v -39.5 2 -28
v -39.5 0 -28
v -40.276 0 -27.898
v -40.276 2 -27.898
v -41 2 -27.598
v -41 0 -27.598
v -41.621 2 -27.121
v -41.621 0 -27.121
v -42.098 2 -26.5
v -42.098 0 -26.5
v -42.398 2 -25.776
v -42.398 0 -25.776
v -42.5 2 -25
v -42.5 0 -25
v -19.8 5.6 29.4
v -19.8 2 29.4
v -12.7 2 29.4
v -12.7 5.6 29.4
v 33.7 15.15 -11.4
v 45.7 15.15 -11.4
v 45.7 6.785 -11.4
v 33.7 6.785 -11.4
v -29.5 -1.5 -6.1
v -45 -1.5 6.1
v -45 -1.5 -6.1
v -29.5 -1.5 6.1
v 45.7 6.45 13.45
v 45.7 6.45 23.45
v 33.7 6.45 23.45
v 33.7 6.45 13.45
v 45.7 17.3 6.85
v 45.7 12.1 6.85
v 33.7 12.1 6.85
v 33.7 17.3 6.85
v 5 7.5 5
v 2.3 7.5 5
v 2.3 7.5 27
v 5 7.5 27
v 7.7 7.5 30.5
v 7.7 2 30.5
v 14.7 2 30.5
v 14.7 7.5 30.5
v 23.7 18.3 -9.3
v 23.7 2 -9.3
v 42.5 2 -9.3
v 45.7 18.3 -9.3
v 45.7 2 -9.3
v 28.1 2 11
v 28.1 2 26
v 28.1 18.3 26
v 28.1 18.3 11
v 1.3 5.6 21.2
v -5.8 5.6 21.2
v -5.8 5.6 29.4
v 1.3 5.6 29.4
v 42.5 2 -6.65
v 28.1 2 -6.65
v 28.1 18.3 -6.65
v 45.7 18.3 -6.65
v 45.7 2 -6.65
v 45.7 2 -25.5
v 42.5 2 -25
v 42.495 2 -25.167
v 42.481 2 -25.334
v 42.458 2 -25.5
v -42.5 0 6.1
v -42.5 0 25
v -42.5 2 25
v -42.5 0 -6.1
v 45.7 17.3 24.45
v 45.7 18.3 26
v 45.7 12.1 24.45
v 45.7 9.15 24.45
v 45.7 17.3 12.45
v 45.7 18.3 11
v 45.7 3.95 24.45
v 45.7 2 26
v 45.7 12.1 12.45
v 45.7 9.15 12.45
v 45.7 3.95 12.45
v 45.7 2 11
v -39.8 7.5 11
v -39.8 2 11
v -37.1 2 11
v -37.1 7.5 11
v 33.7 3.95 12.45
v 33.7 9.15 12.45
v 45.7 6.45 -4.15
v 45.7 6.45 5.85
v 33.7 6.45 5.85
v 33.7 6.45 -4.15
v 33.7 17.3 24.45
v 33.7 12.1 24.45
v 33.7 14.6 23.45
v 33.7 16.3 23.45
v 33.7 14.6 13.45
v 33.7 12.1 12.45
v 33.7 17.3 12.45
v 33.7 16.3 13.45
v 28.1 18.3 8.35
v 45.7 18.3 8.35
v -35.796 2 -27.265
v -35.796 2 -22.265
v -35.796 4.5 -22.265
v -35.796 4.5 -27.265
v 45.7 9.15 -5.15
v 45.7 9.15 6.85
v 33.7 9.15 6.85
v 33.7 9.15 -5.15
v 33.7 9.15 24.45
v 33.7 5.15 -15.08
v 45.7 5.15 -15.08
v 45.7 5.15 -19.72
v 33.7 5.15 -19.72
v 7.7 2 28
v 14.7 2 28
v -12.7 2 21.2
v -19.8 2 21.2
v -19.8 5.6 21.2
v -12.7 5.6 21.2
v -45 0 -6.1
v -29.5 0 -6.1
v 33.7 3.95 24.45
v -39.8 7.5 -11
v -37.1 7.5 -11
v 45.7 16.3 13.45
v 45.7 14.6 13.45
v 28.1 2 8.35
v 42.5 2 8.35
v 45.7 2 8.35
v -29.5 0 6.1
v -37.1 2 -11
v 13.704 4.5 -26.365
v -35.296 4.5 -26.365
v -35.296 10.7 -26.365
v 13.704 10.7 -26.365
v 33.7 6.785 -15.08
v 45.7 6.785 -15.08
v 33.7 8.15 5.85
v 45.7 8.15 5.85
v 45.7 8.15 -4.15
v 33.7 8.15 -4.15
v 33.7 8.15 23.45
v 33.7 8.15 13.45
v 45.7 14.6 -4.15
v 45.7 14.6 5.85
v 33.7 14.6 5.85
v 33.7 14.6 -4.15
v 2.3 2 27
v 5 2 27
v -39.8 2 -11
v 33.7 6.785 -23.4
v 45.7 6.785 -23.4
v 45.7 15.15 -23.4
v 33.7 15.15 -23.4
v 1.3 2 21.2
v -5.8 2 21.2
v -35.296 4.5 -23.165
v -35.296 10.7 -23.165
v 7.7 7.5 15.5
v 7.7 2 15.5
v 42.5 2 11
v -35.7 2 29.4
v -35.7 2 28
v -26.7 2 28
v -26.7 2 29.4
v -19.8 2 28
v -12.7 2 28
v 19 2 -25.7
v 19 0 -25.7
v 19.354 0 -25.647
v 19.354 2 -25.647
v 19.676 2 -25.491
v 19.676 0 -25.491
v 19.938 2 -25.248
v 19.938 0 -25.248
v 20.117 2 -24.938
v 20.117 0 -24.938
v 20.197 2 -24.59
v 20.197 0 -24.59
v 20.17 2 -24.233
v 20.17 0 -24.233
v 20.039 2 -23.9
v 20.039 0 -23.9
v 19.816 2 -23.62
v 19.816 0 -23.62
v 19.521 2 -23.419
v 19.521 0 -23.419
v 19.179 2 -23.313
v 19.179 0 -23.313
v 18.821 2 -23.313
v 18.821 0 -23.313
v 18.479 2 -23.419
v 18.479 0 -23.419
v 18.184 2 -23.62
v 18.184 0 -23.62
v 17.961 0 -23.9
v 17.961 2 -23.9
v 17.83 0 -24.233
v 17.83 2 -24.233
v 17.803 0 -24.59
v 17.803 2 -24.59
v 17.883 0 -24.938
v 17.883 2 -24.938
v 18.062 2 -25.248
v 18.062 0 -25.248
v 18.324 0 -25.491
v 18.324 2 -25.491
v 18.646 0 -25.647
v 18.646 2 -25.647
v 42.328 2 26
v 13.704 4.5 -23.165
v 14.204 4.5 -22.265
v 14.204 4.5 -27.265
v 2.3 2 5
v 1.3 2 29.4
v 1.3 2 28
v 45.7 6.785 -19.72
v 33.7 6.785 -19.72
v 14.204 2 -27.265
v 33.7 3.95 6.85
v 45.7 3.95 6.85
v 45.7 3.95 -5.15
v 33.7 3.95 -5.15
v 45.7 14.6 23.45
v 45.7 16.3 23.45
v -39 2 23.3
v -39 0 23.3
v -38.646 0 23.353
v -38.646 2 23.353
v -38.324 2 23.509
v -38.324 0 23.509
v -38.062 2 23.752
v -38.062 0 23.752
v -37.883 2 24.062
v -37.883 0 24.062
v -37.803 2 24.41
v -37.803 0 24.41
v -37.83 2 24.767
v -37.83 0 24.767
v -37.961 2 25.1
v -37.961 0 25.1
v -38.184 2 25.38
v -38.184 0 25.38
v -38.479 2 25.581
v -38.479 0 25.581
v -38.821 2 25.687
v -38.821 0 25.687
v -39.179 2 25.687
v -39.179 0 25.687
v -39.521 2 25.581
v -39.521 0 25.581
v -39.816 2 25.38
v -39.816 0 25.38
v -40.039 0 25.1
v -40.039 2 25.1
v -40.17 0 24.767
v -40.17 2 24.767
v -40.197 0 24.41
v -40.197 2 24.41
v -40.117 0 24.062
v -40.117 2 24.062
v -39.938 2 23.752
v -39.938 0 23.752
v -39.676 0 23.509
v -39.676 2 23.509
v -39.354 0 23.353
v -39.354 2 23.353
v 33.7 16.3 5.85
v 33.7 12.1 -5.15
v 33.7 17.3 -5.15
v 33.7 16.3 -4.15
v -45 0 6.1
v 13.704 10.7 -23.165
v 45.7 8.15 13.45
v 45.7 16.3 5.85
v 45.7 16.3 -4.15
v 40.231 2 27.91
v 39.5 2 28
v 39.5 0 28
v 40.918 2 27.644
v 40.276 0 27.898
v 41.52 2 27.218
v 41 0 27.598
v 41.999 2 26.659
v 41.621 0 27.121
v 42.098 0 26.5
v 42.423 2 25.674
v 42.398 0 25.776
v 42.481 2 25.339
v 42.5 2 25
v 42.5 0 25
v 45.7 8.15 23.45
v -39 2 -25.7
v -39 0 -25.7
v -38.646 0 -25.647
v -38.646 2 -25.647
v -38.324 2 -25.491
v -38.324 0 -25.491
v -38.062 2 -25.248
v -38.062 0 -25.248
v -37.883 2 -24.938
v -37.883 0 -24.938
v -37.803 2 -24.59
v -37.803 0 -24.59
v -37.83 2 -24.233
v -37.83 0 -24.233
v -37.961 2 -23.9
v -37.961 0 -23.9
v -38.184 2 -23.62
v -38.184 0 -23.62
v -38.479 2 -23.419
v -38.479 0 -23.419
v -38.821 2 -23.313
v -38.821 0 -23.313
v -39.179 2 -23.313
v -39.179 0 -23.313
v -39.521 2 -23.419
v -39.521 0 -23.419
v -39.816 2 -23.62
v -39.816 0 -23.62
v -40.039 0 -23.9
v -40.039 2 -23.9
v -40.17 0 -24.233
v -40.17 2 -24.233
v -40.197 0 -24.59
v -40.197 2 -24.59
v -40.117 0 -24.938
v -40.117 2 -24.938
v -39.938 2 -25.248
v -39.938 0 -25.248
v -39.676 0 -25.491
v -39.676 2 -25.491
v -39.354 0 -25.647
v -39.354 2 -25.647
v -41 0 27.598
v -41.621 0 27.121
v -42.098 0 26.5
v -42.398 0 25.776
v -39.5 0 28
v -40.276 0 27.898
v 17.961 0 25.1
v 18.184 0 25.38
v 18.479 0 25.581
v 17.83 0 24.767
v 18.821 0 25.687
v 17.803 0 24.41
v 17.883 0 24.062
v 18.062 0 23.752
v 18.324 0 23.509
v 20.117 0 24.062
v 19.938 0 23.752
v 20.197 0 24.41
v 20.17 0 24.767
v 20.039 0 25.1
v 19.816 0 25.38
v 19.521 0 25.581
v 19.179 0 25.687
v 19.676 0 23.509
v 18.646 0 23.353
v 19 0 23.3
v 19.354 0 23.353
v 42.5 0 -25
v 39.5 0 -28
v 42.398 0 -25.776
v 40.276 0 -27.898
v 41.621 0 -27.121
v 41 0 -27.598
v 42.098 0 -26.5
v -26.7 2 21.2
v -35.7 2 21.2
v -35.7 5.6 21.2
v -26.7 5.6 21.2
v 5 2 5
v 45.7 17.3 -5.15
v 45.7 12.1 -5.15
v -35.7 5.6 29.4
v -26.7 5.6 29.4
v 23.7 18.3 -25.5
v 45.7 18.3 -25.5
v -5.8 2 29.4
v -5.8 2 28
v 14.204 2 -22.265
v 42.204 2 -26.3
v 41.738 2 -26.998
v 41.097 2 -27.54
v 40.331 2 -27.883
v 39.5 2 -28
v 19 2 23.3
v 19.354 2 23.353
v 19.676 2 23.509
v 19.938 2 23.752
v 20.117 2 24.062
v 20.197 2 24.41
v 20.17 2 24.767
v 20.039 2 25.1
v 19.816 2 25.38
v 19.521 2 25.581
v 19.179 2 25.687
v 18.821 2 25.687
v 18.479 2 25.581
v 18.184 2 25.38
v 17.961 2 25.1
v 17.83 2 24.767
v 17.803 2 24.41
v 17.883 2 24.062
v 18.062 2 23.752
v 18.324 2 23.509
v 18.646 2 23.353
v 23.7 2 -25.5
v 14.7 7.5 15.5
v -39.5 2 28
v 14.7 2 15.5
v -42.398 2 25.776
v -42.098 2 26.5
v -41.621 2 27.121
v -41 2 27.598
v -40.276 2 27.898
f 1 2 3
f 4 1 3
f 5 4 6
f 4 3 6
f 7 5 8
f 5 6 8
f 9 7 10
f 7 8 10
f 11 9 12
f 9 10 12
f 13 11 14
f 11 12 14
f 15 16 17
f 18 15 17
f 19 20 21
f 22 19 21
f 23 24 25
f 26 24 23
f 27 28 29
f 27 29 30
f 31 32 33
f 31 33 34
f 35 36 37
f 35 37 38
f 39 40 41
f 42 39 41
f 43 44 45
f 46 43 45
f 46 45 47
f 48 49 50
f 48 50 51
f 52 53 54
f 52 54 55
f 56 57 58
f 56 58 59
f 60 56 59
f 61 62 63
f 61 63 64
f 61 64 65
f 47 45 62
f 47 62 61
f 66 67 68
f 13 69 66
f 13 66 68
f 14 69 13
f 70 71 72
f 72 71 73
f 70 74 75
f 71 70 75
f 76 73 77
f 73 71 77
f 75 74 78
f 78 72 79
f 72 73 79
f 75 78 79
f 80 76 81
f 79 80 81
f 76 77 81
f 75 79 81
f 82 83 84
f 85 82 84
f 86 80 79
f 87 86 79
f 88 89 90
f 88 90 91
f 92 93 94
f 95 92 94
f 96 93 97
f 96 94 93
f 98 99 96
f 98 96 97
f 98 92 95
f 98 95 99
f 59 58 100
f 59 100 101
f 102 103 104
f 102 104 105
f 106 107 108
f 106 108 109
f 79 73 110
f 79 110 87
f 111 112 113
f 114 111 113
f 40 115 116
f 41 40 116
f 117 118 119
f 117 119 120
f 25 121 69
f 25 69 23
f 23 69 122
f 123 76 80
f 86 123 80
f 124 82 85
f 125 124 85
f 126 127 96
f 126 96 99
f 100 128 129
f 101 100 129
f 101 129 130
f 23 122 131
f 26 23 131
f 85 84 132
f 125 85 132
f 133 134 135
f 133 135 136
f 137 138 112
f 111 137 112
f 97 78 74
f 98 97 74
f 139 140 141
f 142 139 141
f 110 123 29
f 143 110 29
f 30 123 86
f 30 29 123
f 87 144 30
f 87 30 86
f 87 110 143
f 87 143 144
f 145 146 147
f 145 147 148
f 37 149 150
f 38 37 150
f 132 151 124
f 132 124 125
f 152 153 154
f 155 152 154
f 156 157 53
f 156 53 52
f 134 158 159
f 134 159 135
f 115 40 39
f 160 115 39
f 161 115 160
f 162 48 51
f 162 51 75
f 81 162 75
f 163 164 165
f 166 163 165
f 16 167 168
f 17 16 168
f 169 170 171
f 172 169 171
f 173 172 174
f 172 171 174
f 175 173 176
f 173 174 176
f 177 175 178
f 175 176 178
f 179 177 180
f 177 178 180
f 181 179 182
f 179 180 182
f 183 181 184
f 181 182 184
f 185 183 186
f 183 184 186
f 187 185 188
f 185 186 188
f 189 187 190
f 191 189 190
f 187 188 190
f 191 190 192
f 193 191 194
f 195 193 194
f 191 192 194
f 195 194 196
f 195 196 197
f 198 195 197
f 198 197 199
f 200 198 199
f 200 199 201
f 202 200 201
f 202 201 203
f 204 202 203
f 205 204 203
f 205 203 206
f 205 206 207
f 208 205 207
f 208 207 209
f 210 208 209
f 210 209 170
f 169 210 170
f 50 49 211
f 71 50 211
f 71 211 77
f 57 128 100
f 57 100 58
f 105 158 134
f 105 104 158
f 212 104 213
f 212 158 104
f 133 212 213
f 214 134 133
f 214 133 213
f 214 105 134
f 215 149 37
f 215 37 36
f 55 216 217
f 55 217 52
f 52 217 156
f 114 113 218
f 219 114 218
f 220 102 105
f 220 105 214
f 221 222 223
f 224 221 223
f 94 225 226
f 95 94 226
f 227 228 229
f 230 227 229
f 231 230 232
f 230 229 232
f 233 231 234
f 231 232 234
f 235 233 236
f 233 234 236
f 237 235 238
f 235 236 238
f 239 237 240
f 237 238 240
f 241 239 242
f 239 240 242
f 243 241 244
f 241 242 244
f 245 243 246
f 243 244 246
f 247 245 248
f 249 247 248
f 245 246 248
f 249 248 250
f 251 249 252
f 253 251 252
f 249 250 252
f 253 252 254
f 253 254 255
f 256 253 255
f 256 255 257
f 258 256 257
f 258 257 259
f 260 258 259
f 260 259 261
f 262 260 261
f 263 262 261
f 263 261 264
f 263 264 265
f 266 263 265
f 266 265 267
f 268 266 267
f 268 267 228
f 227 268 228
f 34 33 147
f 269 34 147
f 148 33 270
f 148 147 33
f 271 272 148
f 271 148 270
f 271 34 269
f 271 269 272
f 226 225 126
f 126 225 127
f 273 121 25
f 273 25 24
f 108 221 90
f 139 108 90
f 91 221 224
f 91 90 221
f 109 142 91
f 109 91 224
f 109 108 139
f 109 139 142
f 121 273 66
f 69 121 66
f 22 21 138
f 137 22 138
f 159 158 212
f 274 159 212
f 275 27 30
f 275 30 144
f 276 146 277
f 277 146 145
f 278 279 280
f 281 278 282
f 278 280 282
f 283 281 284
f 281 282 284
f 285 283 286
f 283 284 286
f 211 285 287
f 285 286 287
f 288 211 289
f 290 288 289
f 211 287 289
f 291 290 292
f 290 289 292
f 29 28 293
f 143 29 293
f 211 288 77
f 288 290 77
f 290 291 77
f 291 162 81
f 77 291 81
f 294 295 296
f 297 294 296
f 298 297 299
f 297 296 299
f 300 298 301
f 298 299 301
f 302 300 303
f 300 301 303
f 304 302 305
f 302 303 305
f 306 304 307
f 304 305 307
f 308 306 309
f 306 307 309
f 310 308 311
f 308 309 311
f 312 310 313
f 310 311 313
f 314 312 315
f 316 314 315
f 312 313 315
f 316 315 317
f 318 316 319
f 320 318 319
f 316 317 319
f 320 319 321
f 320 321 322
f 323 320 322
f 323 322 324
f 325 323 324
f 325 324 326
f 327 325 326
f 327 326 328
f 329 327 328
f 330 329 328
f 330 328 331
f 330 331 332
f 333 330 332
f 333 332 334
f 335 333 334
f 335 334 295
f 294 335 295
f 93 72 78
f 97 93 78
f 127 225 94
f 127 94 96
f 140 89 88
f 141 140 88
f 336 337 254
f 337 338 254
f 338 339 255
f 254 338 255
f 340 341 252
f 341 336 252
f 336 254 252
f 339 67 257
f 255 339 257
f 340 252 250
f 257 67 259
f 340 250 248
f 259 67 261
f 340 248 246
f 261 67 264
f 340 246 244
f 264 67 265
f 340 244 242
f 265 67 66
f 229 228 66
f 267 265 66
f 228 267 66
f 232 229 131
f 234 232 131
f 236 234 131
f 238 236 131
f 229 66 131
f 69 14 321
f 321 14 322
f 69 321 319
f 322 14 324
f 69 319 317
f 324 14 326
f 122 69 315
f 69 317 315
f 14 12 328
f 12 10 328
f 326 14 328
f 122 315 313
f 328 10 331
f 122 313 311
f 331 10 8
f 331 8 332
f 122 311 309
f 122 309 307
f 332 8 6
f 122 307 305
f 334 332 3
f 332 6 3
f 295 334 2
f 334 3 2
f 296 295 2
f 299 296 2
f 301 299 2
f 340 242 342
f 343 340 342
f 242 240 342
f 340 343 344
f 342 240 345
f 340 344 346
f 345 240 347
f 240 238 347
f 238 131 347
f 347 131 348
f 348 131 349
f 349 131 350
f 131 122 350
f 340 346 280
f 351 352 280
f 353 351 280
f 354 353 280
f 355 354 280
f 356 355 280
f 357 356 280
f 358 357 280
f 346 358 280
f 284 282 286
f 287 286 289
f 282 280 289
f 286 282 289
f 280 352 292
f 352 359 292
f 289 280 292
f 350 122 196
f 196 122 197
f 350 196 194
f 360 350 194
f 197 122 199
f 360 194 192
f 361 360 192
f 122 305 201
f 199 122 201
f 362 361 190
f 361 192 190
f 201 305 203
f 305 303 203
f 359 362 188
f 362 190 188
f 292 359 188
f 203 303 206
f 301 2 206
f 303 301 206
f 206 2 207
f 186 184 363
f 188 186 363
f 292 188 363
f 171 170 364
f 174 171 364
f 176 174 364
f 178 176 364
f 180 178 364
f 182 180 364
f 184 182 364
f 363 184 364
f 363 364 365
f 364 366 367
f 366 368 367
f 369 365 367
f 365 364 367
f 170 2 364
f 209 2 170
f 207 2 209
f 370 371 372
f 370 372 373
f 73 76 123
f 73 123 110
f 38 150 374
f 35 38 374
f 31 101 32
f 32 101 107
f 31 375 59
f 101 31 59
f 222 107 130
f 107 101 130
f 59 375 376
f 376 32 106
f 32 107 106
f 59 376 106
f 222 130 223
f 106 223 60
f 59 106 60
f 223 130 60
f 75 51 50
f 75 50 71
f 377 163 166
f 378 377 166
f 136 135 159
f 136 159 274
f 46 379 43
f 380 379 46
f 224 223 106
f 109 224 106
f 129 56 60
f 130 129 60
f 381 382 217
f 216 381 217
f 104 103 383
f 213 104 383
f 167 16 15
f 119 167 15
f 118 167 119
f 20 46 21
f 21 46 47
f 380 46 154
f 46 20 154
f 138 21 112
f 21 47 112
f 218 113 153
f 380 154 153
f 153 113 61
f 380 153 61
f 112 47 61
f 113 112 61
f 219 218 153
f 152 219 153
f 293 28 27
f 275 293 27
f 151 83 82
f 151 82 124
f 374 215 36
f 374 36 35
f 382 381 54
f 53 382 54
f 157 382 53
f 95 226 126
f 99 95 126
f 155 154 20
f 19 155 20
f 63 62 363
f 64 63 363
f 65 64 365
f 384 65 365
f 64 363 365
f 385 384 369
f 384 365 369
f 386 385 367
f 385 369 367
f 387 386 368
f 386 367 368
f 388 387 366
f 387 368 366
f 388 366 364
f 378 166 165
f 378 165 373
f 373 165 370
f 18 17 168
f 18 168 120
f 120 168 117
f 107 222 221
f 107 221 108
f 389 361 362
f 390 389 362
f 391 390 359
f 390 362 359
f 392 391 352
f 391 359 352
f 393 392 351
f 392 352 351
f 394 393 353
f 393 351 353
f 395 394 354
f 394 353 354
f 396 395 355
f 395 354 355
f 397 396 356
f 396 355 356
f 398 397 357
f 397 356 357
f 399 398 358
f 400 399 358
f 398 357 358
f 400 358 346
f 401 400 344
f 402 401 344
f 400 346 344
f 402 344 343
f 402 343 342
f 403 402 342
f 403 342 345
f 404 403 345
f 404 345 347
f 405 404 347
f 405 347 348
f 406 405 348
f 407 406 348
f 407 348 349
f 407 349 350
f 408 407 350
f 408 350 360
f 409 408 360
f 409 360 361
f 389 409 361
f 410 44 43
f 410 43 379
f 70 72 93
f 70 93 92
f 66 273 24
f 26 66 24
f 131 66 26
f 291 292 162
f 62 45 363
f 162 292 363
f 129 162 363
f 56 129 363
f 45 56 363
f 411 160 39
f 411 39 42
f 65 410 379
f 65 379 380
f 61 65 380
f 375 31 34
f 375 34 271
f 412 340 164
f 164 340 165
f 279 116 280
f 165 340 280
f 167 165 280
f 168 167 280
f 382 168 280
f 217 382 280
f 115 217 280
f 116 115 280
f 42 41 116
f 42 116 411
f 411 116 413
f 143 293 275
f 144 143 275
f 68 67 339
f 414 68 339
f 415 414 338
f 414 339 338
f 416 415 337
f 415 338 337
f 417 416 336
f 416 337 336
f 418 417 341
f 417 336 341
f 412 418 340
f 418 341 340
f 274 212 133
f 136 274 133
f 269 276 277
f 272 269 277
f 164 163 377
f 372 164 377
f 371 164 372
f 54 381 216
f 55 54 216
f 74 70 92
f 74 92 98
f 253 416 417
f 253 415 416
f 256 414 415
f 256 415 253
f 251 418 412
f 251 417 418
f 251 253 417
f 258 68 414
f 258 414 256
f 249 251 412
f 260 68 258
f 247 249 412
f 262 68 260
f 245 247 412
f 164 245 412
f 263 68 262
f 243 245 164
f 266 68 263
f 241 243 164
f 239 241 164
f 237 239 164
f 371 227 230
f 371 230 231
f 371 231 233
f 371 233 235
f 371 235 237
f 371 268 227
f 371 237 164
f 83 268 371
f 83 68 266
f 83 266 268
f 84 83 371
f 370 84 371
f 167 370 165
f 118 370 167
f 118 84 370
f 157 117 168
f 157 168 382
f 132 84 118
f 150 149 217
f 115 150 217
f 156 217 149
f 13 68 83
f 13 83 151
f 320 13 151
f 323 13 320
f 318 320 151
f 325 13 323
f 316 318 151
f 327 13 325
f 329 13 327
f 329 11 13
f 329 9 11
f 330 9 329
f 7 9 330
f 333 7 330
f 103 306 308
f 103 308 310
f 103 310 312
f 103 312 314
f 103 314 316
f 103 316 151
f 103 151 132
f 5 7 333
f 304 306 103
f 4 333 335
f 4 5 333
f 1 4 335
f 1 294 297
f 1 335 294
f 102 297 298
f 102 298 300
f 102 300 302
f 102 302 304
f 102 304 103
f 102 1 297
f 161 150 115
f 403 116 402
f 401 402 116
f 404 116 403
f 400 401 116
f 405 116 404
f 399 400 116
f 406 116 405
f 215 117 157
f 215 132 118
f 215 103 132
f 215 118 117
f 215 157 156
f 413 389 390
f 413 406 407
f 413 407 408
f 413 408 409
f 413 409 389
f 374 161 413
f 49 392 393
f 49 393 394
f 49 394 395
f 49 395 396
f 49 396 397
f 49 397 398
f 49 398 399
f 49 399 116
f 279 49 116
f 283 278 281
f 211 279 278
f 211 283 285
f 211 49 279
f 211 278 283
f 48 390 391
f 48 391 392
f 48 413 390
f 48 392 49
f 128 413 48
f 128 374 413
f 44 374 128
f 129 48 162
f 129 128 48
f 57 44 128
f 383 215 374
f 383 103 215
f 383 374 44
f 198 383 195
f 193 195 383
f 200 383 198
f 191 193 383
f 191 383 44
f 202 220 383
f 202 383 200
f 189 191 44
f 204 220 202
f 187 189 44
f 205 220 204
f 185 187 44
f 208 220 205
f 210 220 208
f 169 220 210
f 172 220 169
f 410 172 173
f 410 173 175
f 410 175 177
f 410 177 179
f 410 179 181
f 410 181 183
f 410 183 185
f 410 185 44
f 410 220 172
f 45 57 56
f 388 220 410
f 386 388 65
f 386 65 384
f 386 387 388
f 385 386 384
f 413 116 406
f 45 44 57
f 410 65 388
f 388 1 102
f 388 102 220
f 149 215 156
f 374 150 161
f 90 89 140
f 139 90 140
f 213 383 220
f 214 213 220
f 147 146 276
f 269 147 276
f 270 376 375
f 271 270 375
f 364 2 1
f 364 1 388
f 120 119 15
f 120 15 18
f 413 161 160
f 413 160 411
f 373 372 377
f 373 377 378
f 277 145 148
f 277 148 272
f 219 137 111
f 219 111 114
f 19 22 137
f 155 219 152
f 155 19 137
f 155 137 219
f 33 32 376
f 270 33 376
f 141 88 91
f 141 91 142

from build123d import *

# Parameters (mm, degrees)
ESQUISSE1_W             = 85
ESQUISSE1_H             = 56
BOSS_EXTRU_1_DEPTH      = 2
D_GAGEMENT_M21_D        = 2.4
ESQUISSE4_W             = 50
ESQUISSE4_H             = 5
BOSS_EXTRU_3_DEPTH      = 2.5
ESQUISSE6_W             = 49
ESQUISSE6_H             = 3.2
BOSS_EXTRU_5_DEPTH      = 6.2
ESQUISSE3_W             = 22
ESQUISSE3_H             = 16.2
ESQUISSE3_W_2           = 17.6
ESQUISSE3_H_2           = 15
BOSS_EXTRU_2_DEPTH      = 16.3
ESQUISSE7_W             = 12
ESQUISSE7_H             = 5.2
ESQUISSE7_W_2           = 10
ESQUISSE7_H_2           = 1.7
ENL_V_MAT_EXTRU_1_DEPTH = 12
ESQUISSE5_W             = 9
ESQUISSE5_H             = 8.2
ESQUISSE5_W_2           = 7.1
BOSS_EXTRU_4_DEPTH      = 3.6
ESQUISSE8_W             = 7
ESQUISSE8_H             = 15
ESQUISSE8_W_2           = 2.7
ESQUISSE8_H_2           = 22
BOSS_EXTRU_6_DEPTH      = 5.5
ESQUISSE9_W             = 15.5
ESQUISSE9_H             = 12.2
BOSS_EXTRU_7_DEPTH      = 1.5
CONG_1_R                = 3


with BuildPart() as part:
    # Esquisse1 → Boss.-Extru.1 (new body)
    with BuildSketch(Plane(origin=(0, 0, 0), x_dir=(1, 0, 0), z_dir=(0, 1, 0))):
        Rectangle(ESQUISSE1_W, ESQUISSE1_H)
    extrude(amount=BOSS_EXTRU_1_DEPTH)

    # Dégagement M21 (through all)
    with Locations(Plane(origin=(-39, 2, -24.5), x_dir=(0, 0, 1), z_dir=(0, 1, 0))):
        with Locations((0, 0), (49, 0), (0, 58), (49, 58)):
            Hole(D_GAGEMENT_M21_D / 2)

    # Esquisse4 → Boss.-Extru.3 (add)
    with BuildSketch(Plane(origin=(0, 2, 0), x_dir=(1, 0, 0), z_dir=(0, 1, 0))):
        with Locations((-10.795881497, 24.765474627)):
            Rectangle(ESQUISSE4_W, ESQUISSE4_H)
    extrude(amount=BOSS_EXTRU_3_DEPTH)

    # Esquisse6 → Boss.-Extru.5 (add)
    with BuildSketch(Plane(origin=(0, 4.5, 0), x_dir=(1, 0, 0), z_dir=(0, 1, 0))):
        with Locations((-10.795881497, 24.765474627)):
            Rectangle(ESQUISSE6_W, ESQUISSE6_H)
    extrude(amount=BOSS_EXTRU_5_DEPTH)

    # Esquisse3 → Boss.-Extru.2 (add)
    with BuildSketch(Plane(origin=(0, 2, 0), x_dir=(1, 0, 0), z_dir=(0, 1, 0))):
        with Locations((34.7, 17.4)):
            Rectangle(ESQUISSE3_W, ESQUISSE3_H)
        with Locations((36.9, -18.5)):
            Rectangle(ESQUISSE3_W_2, ESQUISSE3_H_2)
        with Locations((36.9, -0.85)):
            Rectangle(ESQUISSE3_W_2, ESQUISSE3_H_2)
    extrude(amount=BOSS_EXTRU_2_DEPTH)

    # Esquisse7 → Enlèv. mat.-Extru.1 (cut)
    # profile 1 of 5: a face of its own
    with BuildSketch(Plane(origin=(45.7, 0, 0), x_dir=(0, 0, -1), z_dir=(1, 0, 0))):
        Polygon((23.4, 15.15), (11.4, 15.15), (11.4, 6.785251797), (15.080363944, 6.785251797), (15.080363944, 5.15), (19.719636056, 5.15), (19.719636056, 6.785251797), (23.4, 6.785251797), align=None)
    # profile 2 of 5: a face of its own
    with BuildSketch(Plane(origin=(45.7, 0, 0), x_dir=(0, 0, -1), z_dir=(1, 0, 0))):
        with Locations((-18.45, 14.7)):
            Rectangle(ESQUISSE7_W, ESQUISSE7_H)
        with Locations((-18.45, 15.45)):
            Rectangle(ESQUISSE7_W_2, ESQUISSE7_H_2, mode=Mode.SUBTRACT)
    # profile 3 of 5: a face of its own
    with BuildSketch(Plane(origin=(45.7, 0, 0), x_dir=(0, 0, -1), z_dir=(1, 0, 0))):
        with Locations((-0.85, 14.7)):
            Rectangle(ESQUISSE7_W, ESQUISSE7_H)
        with Locations((-0.85, 15.45)):
            Rectangle(ESQUISSE7_W_2, ESQUISSE7_H_2, mode=Mode.SUBTRACT)
    # profile 4 of 5: a face of its own
    with BuildSketch(Plane(origin=(45.7, 0, 0), x_dir=(0, 0, -1), z_dir=(1, 0, 0))):
        with Locations((-18.45, 6.55)):
            Rectangle(ESQUISSE7_W, ESQUISSE7_H)
        with Locations((-18.45, 7.3)):
            Rectangle(ESQUISSE7_W_2, ESQUISSE7_H_2, mode=Mode.SUBTRACT)
    # profile 5 of 5: a face of its own
    with BuildSketch(Plane(origin=(45.7, 0, 0), x_dir=(0, 0, -1), z_dir=(1, 0, 0))):
        with Locations((-0.85, 6.55)):
            Rectangle(ESQUISSE7_W, ESQUISSE7_H)
        with Locations((-0.85, 7.3)):
            Rectangle(ESQUISSE7_W_2, ESQUISSE7_H_2, mode=Mode.SUBTRACT)
    extrude(amount=-ENL_V_MAT_EXTRU_1_DEPTH, mode=Mode.SUBTRACT)

    # Esquisse5 → Boss.-Extru.4 (add)
    with BuildSketch(Plane(origin=(0, 2, 0), x_dir=(1, 0, 0), z_dir=(0, 1, 0))):
        with Locations((-31.2, -25.3)):
            Rectangle(ESQUISSE5_W, ESQUISSE5_H)
        with Locations((-16.25, -25.3)):
            Rectangle(ESQUISSE5_W_2, ESQUISSE5_H)
        with Locations((-2.25, -25.3)):
            Rectangle(ESQUISSE5_W_2, ESQUISSE5_H)
    extrude(amount=BOSS_EXTRU_4_DEPTH)

    # Esquisse8 → Boss.-Extru.6 (add)
    with BuildSketch(Plane(origin=(0, 2, 0), x_dir=(1, 0, 0), z_dir=(0, 1, 0))):
        with Locations((11.2, -23)):
            Rectangle(ESQUISSE8_W, ESQUISSE8_H)
        with Locations((3.65, -16)):
            Rectangle(ESQUISSE8_W_2, ESQUISSE8_H_2)
        with Locations((-38.45, 0)):
            Rectangle(ESQUISSE8_W_2, ESQUISSE8_H_2)
    extrude(amount=BOSS_EXTRU_6_DEPTH)

    # Esquisse9 → Boss.-Extru.7 (add)
    with BuildSketch(Plane.XZ):
        with Locations((-37.25, 0)):
            Rectangle(ESQUISSE9_W, ESQUISSE9_H)
    extrude(amount=BOSS_EXTRU_7_DEPTH)

    # Congé1
    # the kernel refuses this fillet: 3 mm, written as the material it takes off along each edge
    with BuildSketch(Plane(origin=(42.5, -7.5, 28), x_dir=(0, 0, -1), z_dir=(0, 1, 0)), Plane(origin=(42.5, -7.5, -28), x_dir=(-1, 0, 0), z_dir=(0, 1, 0))) as cong_1_piece_1:
        with BuildLine():
            CenterArc((CONG_1_R, CONG_1_R), CONG_1_R, 180, 90)
            Line((0, CONG_1_R), (0, 0))
            Line((0, 0), (CONG_1_R, 0))
        make_face()
    extrude(amount=9.5, mode=Mode.SUBTRACT)
    with BuildSketch(Plane(origin=(-42.5, -7.5, 28), x_dir=(0, 0, -1), z_dir=(0, 1, 0)), Plane(origin=(-42.5, -7.5, -28), x_dir=(1, 0, 0), z_dir=(0, 1, 0))) as cong_1_piece_2:
        with BuildLine():
            CenterArc((CONG_1_R, -CONG_1_R), CONG_1_R, 90, 90)
            Line((0, -CONG_1_R), (0, 0))
            Line((0, 0), (CONG_1_R, 0))
        make_face()
    extrude(amount=17, mode=Mode.SUBTRACT)


solid = part.part
